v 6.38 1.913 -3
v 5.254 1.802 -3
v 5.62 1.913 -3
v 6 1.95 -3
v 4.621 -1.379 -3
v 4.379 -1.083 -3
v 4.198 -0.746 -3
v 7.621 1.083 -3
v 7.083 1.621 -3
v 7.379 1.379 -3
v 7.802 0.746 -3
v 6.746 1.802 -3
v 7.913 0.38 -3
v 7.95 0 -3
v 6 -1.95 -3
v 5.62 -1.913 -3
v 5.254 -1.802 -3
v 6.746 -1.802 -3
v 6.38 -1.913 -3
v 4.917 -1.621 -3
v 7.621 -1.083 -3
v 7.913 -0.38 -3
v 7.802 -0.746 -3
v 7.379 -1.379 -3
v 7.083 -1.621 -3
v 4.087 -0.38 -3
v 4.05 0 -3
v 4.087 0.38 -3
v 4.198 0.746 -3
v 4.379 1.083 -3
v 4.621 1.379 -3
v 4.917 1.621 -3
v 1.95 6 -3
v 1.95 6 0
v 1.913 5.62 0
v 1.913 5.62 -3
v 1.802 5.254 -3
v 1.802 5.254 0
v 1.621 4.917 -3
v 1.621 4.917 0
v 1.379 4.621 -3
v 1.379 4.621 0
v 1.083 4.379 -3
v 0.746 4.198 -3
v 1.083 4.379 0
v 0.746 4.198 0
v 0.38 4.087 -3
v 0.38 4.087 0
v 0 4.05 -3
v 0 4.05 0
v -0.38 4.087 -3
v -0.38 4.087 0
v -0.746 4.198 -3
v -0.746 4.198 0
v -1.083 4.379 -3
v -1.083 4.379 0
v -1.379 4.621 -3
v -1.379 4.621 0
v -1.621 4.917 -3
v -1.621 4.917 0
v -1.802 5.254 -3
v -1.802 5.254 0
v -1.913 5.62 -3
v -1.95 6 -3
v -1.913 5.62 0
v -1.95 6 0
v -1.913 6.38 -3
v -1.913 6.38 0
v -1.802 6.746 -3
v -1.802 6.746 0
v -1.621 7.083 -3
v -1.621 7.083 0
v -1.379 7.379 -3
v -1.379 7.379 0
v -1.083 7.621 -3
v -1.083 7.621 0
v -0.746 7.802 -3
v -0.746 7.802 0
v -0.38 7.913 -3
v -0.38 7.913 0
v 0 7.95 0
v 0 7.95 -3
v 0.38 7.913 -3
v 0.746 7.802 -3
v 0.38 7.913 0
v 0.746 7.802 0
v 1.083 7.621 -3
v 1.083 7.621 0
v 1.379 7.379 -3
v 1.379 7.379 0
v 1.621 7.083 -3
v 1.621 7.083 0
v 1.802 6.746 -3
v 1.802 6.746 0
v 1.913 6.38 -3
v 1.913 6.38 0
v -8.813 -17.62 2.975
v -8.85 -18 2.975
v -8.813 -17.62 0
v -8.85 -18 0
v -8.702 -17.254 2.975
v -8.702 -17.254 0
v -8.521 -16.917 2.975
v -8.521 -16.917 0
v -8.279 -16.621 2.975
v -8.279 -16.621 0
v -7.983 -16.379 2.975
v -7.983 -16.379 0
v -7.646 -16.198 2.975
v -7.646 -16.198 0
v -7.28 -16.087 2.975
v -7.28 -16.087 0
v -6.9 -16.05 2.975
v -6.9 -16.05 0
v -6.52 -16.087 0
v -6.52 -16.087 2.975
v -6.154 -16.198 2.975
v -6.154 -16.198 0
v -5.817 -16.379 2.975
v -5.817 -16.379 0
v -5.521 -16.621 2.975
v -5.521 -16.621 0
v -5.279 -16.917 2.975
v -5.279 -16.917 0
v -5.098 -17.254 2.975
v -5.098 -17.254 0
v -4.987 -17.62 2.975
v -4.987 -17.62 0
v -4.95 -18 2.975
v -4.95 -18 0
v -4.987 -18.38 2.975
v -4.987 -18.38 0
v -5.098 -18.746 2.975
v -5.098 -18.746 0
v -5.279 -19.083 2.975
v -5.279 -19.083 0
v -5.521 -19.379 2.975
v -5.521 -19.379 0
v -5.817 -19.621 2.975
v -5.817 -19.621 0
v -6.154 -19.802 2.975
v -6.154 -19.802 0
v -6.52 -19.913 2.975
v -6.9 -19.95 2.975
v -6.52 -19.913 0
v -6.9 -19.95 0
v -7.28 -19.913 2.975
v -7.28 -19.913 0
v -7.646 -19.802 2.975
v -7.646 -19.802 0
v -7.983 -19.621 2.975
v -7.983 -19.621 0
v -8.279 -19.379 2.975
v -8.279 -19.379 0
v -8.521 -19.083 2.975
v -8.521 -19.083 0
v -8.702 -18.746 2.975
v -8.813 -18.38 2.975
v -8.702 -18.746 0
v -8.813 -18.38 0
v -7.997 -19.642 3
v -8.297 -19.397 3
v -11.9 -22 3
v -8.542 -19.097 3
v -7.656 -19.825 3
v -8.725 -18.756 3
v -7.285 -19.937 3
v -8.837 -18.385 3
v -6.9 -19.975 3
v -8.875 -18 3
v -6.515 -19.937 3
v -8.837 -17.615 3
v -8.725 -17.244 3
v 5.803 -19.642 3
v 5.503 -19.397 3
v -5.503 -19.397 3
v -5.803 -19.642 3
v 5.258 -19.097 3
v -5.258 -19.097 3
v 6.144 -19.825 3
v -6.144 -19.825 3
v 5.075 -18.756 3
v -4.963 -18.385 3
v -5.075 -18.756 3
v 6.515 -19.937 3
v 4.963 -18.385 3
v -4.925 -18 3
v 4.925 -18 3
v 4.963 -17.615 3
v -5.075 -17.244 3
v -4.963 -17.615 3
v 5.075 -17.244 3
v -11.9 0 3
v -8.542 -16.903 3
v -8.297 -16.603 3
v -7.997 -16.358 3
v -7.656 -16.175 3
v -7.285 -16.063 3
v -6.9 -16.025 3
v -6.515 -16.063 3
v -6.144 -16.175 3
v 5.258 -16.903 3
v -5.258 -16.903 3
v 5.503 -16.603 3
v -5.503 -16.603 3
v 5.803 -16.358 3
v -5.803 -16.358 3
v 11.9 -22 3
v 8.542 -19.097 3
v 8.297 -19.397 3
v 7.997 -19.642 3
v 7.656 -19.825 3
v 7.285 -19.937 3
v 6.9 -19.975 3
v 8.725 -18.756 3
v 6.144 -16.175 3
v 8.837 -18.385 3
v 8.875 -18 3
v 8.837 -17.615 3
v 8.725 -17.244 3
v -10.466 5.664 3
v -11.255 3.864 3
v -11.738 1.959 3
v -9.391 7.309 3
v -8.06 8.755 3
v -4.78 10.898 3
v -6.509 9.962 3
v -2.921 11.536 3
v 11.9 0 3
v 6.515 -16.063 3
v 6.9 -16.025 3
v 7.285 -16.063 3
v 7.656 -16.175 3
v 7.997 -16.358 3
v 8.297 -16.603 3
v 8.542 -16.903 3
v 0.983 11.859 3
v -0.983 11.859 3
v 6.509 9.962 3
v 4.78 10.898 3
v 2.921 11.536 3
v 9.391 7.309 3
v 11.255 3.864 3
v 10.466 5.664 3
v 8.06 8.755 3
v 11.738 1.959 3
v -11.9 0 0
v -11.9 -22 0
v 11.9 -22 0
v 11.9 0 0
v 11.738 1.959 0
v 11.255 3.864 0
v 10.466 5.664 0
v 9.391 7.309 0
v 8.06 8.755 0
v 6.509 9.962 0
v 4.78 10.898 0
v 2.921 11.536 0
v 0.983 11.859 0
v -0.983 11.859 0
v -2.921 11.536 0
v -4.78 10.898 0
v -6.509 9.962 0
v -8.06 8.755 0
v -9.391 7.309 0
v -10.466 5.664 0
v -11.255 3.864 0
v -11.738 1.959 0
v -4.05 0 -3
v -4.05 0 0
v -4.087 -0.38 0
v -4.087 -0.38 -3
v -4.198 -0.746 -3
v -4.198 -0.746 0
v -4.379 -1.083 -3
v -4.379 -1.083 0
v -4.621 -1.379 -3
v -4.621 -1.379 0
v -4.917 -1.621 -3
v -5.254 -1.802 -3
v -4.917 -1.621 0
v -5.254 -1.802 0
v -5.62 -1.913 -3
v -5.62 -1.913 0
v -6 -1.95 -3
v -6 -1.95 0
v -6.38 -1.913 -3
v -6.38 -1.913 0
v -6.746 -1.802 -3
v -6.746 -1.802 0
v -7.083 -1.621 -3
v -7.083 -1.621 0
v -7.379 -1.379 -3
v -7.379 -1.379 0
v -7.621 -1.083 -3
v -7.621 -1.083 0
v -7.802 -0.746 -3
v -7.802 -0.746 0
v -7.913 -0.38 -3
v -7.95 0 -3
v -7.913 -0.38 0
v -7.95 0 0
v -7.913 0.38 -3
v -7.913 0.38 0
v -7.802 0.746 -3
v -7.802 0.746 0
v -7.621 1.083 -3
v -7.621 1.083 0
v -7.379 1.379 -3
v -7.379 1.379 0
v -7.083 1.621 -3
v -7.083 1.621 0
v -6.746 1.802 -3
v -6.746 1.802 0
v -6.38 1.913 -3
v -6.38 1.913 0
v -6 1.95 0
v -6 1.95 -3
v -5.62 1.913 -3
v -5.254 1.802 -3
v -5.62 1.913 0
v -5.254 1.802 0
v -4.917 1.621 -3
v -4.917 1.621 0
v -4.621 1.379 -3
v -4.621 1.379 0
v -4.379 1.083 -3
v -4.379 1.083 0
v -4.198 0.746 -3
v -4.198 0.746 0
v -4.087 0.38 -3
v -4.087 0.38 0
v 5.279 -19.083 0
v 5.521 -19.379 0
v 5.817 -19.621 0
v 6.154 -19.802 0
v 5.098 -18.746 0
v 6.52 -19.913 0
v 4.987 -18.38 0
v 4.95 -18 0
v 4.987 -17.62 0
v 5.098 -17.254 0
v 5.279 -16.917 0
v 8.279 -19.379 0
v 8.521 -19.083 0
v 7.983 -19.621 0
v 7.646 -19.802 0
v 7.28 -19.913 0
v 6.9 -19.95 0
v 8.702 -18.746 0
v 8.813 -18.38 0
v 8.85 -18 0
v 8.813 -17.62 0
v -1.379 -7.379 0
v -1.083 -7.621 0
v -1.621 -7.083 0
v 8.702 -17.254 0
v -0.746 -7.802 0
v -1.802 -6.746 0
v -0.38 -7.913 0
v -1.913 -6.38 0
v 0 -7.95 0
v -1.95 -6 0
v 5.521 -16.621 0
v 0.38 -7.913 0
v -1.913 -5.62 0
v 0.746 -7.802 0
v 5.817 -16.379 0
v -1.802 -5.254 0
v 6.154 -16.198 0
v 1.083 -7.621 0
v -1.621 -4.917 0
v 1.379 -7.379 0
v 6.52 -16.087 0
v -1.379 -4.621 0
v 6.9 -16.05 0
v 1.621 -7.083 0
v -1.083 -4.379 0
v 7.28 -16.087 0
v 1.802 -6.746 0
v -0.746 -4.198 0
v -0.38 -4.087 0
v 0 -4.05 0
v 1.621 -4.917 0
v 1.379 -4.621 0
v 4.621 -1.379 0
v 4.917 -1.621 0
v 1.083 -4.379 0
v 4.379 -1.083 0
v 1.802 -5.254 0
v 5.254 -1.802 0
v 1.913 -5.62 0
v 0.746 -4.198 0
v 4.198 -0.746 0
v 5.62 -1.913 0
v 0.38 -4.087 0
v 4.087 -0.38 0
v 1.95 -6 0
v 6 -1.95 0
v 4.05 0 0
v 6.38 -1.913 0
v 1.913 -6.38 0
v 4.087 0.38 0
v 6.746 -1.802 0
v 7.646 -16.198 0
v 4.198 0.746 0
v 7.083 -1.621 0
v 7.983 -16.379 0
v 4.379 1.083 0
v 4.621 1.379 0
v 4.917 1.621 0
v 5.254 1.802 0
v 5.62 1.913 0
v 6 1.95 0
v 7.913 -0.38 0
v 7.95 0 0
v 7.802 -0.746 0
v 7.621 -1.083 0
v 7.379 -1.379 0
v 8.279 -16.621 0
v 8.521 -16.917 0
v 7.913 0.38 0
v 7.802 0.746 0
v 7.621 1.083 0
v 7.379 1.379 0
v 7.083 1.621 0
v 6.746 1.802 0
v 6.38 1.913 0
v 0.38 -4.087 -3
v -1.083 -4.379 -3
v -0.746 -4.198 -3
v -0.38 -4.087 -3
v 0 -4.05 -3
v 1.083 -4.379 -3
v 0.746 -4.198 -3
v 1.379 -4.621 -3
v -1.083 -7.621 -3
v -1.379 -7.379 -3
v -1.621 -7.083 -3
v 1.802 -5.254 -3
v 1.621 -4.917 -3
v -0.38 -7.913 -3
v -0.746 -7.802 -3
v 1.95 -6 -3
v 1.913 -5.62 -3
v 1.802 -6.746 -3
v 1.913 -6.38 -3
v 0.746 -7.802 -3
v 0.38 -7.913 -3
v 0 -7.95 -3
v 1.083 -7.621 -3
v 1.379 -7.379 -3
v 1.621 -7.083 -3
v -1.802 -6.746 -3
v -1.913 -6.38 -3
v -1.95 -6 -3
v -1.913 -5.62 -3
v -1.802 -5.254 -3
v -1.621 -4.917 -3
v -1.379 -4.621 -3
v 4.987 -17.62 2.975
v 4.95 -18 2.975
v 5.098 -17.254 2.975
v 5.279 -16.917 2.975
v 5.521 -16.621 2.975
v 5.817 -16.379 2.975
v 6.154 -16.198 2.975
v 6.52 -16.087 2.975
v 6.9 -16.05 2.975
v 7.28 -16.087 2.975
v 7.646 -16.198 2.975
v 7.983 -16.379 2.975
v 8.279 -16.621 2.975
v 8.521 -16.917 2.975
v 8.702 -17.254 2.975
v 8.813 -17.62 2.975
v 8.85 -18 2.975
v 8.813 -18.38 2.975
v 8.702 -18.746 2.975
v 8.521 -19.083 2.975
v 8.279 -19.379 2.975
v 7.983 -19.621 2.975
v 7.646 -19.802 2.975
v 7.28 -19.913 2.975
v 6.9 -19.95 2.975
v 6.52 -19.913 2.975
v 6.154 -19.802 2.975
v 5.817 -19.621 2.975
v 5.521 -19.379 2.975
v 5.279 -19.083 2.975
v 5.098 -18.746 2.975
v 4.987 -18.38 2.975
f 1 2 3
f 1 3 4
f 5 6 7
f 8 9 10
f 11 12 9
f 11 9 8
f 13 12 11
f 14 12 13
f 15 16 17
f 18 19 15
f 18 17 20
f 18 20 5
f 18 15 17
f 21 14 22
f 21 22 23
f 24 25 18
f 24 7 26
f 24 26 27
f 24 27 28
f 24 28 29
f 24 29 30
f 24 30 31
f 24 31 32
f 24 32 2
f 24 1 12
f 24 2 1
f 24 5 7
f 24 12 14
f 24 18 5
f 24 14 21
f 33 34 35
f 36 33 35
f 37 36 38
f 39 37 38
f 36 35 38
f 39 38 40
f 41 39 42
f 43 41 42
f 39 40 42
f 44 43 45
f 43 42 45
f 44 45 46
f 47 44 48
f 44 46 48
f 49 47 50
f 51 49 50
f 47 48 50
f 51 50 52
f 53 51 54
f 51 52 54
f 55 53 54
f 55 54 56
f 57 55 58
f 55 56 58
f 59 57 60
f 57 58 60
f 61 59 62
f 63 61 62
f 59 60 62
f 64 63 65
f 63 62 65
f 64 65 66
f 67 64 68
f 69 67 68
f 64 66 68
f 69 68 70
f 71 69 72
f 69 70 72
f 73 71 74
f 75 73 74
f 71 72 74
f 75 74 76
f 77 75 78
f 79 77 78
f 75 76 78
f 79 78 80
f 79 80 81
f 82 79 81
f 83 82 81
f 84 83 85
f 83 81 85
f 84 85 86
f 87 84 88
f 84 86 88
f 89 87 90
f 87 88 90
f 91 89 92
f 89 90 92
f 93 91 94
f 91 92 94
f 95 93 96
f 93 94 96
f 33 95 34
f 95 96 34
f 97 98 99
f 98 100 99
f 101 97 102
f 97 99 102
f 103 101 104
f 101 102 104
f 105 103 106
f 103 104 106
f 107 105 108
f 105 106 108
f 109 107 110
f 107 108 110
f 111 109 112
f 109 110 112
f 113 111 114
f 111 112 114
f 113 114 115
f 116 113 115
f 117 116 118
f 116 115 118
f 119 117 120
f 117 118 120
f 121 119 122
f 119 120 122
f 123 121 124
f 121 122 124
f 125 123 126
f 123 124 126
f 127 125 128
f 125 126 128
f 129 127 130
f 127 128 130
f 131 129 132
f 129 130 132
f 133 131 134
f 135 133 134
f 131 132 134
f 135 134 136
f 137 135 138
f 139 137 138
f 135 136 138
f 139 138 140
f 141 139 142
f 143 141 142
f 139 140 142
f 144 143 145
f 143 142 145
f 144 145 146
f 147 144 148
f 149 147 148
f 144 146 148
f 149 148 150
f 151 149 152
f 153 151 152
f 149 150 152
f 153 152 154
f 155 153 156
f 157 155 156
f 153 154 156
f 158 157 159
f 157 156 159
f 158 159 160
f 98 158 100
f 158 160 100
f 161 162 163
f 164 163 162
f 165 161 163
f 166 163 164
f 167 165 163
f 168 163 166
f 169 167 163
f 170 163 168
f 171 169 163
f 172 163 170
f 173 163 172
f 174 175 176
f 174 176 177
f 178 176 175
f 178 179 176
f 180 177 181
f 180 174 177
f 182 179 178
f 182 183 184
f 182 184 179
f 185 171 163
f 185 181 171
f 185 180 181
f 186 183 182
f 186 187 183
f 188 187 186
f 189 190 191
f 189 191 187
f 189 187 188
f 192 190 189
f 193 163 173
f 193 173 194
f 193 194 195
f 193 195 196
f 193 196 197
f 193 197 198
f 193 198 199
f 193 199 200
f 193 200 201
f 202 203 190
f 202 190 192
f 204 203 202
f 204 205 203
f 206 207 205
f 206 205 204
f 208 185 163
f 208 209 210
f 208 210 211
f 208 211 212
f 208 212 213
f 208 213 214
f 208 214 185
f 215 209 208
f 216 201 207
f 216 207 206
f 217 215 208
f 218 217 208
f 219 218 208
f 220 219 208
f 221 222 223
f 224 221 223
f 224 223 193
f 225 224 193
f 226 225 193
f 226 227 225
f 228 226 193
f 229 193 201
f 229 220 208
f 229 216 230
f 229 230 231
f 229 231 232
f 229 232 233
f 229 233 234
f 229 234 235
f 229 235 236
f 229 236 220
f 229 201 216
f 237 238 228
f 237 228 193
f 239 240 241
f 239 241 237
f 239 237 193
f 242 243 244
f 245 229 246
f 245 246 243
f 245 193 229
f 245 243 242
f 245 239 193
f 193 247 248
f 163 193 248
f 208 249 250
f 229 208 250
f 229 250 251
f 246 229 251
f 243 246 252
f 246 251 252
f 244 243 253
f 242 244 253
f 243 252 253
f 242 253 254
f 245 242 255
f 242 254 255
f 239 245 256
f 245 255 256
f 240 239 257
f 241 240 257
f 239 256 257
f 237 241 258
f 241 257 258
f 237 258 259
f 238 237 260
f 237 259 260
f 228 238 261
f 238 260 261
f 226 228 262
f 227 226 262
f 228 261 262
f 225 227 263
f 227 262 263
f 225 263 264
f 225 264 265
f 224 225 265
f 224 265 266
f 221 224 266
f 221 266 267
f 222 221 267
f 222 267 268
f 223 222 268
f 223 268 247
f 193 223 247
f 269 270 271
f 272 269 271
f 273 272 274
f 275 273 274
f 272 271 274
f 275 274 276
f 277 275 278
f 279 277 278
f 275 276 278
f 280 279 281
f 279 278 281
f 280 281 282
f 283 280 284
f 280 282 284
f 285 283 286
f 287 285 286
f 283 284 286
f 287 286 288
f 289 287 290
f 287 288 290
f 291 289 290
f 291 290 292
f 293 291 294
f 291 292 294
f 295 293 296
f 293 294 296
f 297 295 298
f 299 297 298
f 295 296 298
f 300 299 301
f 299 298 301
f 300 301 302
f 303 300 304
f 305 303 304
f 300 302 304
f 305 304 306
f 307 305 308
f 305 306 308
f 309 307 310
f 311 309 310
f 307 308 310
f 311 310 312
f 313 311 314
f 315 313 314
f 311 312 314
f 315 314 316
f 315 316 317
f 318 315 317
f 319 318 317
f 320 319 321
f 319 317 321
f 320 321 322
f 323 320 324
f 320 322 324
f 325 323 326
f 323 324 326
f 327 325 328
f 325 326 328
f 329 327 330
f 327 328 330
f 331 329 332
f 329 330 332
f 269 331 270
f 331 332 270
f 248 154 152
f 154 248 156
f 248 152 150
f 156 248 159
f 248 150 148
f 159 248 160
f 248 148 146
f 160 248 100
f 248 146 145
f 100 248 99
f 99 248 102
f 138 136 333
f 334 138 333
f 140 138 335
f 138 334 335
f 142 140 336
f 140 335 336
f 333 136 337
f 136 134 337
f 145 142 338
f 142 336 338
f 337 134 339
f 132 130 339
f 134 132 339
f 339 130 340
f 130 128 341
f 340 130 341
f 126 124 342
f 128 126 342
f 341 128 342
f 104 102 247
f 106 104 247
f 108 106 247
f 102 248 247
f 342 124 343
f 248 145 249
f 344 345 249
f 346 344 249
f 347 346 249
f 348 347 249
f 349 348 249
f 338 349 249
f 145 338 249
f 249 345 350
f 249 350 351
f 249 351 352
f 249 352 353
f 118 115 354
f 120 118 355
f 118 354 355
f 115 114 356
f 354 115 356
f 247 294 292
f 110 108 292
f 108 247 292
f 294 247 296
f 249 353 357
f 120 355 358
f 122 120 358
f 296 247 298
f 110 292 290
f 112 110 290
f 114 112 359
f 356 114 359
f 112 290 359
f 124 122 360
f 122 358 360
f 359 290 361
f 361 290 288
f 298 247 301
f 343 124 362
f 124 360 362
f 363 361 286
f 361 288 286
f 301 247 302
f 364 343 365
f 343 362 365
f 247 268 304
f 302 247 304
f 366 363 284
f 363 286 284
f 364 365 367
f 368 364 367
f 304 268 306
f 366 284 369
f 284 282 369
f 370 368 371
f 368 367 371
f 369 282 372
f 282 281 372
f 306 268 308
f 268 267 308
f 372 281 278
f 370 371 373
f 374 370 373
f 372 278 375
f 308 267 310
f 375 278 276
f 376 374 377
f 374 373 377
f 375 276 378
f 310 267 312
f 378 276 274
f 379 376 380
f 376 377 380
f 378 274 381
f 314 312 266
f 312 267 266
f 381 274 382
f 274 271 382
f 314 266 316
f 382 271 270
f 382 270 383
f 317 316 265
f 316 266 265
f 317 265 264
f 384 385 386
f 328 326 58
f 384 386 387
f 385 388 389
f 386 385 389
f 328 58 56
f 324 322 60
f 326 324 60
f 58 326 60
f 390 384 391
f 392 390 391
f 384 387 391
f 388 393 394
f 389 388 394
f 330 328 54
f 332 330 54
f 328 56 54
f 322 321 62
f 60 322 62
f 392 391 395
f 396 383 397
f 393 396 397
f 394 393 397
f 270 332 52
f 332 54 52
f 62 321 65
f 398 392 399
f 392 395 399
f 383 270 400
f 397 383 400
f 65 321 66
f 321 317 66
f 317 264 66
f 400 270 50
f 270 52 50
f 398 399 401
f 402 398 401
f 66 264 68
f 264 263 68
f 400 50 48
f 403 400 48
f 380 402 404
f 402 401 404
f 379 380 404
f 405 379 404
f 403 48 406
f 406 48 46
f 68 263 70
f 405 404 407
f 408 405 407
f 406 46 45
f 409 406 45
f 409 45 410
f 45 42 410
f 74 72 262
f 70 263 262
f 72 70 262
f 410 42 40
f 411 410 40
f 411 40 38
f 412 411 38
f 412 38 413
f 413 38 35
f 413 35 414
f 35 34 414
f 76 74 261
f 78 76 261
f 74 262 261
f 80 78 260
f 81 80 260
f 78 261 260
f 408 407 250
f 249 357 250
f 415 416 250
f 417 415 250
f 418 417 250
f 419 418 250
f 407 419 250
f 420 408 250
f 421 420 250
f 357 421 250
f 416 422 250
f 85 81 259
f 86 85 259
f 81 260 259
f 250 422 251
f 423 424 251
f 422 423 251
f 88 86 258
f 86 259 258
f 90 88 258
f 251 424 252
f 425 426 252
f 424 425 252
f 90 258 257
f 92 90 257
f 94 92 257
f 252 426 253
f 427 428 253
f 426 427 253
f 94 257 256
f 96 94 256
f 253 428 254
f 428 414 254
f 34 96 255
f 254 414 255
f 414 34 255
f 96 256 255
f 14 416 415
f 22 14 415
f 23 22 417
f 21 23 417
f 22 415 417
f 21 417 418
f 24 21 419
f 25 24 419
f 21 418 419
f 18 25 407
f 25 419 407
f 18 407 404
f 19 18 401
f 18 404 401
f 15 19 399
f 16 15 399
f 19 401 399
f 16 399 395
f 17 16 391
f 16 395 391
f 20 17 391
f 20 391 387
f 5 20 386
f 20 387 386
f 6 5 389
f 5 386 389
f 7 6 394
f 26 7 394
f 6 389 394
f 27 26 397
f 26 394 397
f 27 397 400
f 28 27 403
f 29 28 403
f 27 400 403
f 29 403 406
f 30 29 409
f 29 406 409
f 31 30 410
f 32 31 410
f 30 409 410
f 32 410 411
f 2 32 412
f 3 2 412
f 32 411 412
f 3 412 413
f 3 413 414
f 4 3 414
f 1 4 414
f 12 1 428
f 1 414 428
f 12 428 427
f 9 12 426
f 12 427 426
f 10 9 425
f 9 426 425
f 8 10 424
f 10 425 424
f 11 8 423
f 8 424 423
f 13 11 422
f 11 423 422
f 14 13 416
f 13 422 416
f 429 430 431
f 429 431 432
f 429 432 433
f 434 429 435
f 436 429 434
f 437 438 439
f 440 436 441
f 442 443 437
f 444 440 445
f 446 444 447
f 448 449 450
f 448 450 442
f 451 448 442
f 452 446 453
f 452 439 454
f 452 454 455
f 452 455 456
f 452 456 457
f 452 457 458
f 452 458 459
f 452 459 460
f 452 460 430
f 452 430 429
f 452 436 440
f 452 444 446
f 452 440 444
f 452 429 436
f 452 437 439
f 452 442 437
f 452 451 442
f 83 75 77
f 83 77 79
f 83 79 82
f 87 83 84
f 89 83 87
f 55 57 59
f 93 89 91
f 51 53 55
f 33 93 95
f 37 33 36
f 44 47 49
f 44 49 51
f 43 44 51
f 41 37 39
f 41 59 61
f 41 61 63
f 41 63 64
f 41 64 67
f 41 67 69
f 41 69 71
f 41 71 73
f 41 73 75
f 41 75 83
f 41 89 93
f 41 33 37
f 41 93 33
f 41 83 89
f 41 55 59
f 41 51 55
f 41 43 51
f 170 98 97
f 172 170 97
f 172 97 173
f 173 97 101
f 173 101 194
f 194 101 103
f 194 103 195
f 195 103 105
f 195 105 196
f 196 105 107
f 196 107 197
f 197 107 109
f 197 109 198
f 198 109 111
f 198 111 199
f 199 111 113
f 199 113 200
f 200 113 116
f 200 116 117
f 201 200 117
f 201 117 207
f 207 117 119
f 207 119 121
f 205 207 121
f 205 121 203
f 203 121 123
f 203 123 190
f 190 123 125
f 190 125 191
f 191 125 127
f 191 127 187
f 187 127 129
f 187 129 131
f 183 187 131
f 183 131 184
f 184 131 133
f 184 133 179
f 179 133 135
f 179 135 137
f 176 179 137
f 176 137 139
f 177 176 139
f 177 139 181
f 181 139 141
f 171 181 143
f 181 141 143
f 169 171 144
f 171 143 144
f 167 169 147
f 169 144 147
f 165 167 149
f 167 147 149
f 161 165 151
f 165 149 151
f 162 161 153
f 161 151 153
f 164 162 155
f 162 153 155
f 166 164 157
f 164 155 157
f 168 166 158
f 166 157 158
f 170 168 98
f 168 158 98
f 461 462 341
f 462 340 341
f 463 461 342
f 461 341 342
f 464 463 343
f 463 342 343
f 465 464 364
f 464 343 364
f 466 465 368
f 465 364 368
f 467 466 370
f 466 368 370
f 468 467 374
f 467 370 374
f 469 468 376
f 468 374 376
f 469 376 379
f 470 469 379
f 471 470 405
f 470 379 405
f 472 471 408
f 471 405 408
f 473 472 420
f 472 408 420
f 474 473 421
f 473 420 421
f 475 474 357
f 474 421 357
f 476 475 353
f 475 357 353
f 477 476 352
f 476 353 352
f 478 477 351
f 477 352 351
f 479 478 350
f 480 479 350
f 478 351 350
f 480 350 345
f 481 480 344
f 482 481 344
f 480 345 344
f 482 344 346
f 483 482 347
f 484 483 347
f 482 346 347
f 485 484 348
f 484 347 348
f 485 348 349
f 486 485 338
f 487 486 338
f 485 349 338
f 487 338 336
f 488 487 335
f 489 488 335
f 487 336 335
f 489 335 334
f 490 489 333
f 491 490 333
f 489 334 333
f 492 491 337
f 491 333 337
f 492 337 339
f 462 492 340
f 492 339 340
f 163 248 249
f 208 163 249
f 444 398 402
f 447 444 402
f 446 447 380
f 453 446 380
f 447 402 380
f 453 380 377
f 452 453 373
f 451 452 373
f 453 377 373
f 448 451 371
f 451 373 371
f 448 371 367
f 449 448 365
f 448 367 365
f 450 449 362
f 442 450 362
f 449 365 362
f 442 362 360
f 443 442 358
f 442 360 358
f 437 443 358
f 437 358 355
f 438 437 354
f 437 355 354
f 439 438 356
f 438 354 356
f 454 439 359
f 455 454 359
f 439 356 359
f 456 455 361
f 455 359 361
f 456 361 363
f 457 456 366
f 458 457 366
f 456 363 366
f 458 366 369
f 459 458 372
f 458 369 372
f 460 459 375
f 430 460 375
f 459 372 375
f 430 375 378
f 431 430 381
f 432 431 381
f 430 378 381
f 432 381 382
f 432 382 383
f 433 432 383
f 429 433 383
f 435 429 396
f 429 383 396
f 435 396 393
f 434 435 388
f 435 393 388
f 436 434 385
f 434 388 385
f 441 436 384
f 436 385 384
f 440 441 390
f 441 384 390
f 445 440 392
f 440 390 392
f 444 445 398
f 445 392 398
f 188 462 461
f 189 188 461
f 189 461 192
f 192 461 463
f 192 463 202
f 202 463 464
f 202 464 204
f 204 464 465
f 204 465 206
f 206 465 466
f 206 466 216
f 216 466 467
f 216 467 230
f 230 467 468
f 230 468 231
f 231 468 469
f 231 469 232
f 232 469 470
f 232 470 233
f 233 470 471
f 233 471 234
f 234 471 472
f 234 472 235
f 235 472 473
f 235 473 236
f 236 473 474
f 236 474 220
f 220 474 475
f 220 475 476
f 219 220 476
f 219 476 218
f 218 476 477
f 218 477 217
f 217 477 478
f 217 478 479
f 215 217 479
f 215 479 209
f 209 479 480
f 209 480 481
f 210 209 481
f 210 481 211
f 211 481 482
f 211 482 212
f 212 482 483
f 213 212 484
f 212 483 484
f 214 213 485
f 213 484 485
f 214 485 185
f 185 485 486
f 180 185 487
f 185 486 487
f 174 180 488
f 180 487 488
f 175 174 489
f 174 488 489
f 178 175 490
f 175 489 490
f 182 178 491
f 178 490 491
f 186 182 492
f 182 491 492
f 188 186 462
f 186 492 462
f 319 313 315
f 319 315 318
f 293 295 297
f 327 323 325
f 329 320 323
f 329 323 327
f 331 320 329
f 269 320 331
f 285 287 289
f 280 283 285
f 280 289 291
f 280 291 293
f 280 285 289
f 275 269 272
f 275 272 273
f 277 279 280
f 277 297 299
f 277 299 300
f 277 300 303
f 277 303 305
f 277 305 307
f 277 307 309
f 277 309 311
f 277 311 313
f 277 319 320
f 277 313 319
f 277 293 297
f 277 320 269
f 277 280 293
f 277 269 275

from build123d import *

# Parameters (mm, degrees)
BOSS_EXTRUDE1_DEPTH              = 3
SKETCH2_R                        = 1.95
BOSS_EXTRUDE2_DEPTH              = 3
M3_5_CLEARANCE_HOLE1_D           = 3.9
M3_5_CLEARANCE_HOLE1_CSINK_D     = 3.95
M3_5_CLEARANCE_HOLE1_CSINK_ANGLE = 90


with BuildPart() as part:
    # Sketch1 → Boss-Extrude1 (new body)
    with BuildSketch(Plane.XY):
        with BuildLine():
            Line((-11.9, 0), (-11.9, -22))
            Line((-11.9, -22), (11.9, -22))
            Line((11.9, -22), (11.9, 0))
            ThreePointArc((11.9, 0), (0, 11.9), (-11.9, 0))
        make_face()
    extrude(amount=BOSS_EXTRUDE1_DEPTH)

    # Sketch2 → Boss-Extrude2 (add)
    with BuildSketch(Plane(origin=(0, 0, 0), x_dir=(-1, 0, 0), z_dir=(0, 0, -1))):
        with Locations(Location((0, 6, 0), (0, 0, 180))):
            Circle(SKETCH2_R)
        with Locations(Location((6, 0, 0), (0, 0, 180))):
            Circle(SKETCH2_R)
        with Locations(Location((0, -6, 0), (0, 0, 180))):
            Circle(SKETCH2_R)
        with Locations(Location((-6, 0, 0), (0, 0, 180))):
            Circle(SKETCH2_R)
    extrude(amount=BOSS_EXTRUDE2_DEPTH)

    # M3.5 Clearance Hole1 (through all)
    with Locations(Plane.XY.offset(3)):
        with Locations((6.9, -18), (-6.9, -18)):
            CounterSinkHole(M3_5_CLEARANCE_HOLE1_D / 2, M3_5_CLEARANCE_HOLE1_CSINK_D / 2, counter_sink_angle=M3_5_CLEARANCE_HOLE1_CSINK_ANGLE)


solid = part.part
